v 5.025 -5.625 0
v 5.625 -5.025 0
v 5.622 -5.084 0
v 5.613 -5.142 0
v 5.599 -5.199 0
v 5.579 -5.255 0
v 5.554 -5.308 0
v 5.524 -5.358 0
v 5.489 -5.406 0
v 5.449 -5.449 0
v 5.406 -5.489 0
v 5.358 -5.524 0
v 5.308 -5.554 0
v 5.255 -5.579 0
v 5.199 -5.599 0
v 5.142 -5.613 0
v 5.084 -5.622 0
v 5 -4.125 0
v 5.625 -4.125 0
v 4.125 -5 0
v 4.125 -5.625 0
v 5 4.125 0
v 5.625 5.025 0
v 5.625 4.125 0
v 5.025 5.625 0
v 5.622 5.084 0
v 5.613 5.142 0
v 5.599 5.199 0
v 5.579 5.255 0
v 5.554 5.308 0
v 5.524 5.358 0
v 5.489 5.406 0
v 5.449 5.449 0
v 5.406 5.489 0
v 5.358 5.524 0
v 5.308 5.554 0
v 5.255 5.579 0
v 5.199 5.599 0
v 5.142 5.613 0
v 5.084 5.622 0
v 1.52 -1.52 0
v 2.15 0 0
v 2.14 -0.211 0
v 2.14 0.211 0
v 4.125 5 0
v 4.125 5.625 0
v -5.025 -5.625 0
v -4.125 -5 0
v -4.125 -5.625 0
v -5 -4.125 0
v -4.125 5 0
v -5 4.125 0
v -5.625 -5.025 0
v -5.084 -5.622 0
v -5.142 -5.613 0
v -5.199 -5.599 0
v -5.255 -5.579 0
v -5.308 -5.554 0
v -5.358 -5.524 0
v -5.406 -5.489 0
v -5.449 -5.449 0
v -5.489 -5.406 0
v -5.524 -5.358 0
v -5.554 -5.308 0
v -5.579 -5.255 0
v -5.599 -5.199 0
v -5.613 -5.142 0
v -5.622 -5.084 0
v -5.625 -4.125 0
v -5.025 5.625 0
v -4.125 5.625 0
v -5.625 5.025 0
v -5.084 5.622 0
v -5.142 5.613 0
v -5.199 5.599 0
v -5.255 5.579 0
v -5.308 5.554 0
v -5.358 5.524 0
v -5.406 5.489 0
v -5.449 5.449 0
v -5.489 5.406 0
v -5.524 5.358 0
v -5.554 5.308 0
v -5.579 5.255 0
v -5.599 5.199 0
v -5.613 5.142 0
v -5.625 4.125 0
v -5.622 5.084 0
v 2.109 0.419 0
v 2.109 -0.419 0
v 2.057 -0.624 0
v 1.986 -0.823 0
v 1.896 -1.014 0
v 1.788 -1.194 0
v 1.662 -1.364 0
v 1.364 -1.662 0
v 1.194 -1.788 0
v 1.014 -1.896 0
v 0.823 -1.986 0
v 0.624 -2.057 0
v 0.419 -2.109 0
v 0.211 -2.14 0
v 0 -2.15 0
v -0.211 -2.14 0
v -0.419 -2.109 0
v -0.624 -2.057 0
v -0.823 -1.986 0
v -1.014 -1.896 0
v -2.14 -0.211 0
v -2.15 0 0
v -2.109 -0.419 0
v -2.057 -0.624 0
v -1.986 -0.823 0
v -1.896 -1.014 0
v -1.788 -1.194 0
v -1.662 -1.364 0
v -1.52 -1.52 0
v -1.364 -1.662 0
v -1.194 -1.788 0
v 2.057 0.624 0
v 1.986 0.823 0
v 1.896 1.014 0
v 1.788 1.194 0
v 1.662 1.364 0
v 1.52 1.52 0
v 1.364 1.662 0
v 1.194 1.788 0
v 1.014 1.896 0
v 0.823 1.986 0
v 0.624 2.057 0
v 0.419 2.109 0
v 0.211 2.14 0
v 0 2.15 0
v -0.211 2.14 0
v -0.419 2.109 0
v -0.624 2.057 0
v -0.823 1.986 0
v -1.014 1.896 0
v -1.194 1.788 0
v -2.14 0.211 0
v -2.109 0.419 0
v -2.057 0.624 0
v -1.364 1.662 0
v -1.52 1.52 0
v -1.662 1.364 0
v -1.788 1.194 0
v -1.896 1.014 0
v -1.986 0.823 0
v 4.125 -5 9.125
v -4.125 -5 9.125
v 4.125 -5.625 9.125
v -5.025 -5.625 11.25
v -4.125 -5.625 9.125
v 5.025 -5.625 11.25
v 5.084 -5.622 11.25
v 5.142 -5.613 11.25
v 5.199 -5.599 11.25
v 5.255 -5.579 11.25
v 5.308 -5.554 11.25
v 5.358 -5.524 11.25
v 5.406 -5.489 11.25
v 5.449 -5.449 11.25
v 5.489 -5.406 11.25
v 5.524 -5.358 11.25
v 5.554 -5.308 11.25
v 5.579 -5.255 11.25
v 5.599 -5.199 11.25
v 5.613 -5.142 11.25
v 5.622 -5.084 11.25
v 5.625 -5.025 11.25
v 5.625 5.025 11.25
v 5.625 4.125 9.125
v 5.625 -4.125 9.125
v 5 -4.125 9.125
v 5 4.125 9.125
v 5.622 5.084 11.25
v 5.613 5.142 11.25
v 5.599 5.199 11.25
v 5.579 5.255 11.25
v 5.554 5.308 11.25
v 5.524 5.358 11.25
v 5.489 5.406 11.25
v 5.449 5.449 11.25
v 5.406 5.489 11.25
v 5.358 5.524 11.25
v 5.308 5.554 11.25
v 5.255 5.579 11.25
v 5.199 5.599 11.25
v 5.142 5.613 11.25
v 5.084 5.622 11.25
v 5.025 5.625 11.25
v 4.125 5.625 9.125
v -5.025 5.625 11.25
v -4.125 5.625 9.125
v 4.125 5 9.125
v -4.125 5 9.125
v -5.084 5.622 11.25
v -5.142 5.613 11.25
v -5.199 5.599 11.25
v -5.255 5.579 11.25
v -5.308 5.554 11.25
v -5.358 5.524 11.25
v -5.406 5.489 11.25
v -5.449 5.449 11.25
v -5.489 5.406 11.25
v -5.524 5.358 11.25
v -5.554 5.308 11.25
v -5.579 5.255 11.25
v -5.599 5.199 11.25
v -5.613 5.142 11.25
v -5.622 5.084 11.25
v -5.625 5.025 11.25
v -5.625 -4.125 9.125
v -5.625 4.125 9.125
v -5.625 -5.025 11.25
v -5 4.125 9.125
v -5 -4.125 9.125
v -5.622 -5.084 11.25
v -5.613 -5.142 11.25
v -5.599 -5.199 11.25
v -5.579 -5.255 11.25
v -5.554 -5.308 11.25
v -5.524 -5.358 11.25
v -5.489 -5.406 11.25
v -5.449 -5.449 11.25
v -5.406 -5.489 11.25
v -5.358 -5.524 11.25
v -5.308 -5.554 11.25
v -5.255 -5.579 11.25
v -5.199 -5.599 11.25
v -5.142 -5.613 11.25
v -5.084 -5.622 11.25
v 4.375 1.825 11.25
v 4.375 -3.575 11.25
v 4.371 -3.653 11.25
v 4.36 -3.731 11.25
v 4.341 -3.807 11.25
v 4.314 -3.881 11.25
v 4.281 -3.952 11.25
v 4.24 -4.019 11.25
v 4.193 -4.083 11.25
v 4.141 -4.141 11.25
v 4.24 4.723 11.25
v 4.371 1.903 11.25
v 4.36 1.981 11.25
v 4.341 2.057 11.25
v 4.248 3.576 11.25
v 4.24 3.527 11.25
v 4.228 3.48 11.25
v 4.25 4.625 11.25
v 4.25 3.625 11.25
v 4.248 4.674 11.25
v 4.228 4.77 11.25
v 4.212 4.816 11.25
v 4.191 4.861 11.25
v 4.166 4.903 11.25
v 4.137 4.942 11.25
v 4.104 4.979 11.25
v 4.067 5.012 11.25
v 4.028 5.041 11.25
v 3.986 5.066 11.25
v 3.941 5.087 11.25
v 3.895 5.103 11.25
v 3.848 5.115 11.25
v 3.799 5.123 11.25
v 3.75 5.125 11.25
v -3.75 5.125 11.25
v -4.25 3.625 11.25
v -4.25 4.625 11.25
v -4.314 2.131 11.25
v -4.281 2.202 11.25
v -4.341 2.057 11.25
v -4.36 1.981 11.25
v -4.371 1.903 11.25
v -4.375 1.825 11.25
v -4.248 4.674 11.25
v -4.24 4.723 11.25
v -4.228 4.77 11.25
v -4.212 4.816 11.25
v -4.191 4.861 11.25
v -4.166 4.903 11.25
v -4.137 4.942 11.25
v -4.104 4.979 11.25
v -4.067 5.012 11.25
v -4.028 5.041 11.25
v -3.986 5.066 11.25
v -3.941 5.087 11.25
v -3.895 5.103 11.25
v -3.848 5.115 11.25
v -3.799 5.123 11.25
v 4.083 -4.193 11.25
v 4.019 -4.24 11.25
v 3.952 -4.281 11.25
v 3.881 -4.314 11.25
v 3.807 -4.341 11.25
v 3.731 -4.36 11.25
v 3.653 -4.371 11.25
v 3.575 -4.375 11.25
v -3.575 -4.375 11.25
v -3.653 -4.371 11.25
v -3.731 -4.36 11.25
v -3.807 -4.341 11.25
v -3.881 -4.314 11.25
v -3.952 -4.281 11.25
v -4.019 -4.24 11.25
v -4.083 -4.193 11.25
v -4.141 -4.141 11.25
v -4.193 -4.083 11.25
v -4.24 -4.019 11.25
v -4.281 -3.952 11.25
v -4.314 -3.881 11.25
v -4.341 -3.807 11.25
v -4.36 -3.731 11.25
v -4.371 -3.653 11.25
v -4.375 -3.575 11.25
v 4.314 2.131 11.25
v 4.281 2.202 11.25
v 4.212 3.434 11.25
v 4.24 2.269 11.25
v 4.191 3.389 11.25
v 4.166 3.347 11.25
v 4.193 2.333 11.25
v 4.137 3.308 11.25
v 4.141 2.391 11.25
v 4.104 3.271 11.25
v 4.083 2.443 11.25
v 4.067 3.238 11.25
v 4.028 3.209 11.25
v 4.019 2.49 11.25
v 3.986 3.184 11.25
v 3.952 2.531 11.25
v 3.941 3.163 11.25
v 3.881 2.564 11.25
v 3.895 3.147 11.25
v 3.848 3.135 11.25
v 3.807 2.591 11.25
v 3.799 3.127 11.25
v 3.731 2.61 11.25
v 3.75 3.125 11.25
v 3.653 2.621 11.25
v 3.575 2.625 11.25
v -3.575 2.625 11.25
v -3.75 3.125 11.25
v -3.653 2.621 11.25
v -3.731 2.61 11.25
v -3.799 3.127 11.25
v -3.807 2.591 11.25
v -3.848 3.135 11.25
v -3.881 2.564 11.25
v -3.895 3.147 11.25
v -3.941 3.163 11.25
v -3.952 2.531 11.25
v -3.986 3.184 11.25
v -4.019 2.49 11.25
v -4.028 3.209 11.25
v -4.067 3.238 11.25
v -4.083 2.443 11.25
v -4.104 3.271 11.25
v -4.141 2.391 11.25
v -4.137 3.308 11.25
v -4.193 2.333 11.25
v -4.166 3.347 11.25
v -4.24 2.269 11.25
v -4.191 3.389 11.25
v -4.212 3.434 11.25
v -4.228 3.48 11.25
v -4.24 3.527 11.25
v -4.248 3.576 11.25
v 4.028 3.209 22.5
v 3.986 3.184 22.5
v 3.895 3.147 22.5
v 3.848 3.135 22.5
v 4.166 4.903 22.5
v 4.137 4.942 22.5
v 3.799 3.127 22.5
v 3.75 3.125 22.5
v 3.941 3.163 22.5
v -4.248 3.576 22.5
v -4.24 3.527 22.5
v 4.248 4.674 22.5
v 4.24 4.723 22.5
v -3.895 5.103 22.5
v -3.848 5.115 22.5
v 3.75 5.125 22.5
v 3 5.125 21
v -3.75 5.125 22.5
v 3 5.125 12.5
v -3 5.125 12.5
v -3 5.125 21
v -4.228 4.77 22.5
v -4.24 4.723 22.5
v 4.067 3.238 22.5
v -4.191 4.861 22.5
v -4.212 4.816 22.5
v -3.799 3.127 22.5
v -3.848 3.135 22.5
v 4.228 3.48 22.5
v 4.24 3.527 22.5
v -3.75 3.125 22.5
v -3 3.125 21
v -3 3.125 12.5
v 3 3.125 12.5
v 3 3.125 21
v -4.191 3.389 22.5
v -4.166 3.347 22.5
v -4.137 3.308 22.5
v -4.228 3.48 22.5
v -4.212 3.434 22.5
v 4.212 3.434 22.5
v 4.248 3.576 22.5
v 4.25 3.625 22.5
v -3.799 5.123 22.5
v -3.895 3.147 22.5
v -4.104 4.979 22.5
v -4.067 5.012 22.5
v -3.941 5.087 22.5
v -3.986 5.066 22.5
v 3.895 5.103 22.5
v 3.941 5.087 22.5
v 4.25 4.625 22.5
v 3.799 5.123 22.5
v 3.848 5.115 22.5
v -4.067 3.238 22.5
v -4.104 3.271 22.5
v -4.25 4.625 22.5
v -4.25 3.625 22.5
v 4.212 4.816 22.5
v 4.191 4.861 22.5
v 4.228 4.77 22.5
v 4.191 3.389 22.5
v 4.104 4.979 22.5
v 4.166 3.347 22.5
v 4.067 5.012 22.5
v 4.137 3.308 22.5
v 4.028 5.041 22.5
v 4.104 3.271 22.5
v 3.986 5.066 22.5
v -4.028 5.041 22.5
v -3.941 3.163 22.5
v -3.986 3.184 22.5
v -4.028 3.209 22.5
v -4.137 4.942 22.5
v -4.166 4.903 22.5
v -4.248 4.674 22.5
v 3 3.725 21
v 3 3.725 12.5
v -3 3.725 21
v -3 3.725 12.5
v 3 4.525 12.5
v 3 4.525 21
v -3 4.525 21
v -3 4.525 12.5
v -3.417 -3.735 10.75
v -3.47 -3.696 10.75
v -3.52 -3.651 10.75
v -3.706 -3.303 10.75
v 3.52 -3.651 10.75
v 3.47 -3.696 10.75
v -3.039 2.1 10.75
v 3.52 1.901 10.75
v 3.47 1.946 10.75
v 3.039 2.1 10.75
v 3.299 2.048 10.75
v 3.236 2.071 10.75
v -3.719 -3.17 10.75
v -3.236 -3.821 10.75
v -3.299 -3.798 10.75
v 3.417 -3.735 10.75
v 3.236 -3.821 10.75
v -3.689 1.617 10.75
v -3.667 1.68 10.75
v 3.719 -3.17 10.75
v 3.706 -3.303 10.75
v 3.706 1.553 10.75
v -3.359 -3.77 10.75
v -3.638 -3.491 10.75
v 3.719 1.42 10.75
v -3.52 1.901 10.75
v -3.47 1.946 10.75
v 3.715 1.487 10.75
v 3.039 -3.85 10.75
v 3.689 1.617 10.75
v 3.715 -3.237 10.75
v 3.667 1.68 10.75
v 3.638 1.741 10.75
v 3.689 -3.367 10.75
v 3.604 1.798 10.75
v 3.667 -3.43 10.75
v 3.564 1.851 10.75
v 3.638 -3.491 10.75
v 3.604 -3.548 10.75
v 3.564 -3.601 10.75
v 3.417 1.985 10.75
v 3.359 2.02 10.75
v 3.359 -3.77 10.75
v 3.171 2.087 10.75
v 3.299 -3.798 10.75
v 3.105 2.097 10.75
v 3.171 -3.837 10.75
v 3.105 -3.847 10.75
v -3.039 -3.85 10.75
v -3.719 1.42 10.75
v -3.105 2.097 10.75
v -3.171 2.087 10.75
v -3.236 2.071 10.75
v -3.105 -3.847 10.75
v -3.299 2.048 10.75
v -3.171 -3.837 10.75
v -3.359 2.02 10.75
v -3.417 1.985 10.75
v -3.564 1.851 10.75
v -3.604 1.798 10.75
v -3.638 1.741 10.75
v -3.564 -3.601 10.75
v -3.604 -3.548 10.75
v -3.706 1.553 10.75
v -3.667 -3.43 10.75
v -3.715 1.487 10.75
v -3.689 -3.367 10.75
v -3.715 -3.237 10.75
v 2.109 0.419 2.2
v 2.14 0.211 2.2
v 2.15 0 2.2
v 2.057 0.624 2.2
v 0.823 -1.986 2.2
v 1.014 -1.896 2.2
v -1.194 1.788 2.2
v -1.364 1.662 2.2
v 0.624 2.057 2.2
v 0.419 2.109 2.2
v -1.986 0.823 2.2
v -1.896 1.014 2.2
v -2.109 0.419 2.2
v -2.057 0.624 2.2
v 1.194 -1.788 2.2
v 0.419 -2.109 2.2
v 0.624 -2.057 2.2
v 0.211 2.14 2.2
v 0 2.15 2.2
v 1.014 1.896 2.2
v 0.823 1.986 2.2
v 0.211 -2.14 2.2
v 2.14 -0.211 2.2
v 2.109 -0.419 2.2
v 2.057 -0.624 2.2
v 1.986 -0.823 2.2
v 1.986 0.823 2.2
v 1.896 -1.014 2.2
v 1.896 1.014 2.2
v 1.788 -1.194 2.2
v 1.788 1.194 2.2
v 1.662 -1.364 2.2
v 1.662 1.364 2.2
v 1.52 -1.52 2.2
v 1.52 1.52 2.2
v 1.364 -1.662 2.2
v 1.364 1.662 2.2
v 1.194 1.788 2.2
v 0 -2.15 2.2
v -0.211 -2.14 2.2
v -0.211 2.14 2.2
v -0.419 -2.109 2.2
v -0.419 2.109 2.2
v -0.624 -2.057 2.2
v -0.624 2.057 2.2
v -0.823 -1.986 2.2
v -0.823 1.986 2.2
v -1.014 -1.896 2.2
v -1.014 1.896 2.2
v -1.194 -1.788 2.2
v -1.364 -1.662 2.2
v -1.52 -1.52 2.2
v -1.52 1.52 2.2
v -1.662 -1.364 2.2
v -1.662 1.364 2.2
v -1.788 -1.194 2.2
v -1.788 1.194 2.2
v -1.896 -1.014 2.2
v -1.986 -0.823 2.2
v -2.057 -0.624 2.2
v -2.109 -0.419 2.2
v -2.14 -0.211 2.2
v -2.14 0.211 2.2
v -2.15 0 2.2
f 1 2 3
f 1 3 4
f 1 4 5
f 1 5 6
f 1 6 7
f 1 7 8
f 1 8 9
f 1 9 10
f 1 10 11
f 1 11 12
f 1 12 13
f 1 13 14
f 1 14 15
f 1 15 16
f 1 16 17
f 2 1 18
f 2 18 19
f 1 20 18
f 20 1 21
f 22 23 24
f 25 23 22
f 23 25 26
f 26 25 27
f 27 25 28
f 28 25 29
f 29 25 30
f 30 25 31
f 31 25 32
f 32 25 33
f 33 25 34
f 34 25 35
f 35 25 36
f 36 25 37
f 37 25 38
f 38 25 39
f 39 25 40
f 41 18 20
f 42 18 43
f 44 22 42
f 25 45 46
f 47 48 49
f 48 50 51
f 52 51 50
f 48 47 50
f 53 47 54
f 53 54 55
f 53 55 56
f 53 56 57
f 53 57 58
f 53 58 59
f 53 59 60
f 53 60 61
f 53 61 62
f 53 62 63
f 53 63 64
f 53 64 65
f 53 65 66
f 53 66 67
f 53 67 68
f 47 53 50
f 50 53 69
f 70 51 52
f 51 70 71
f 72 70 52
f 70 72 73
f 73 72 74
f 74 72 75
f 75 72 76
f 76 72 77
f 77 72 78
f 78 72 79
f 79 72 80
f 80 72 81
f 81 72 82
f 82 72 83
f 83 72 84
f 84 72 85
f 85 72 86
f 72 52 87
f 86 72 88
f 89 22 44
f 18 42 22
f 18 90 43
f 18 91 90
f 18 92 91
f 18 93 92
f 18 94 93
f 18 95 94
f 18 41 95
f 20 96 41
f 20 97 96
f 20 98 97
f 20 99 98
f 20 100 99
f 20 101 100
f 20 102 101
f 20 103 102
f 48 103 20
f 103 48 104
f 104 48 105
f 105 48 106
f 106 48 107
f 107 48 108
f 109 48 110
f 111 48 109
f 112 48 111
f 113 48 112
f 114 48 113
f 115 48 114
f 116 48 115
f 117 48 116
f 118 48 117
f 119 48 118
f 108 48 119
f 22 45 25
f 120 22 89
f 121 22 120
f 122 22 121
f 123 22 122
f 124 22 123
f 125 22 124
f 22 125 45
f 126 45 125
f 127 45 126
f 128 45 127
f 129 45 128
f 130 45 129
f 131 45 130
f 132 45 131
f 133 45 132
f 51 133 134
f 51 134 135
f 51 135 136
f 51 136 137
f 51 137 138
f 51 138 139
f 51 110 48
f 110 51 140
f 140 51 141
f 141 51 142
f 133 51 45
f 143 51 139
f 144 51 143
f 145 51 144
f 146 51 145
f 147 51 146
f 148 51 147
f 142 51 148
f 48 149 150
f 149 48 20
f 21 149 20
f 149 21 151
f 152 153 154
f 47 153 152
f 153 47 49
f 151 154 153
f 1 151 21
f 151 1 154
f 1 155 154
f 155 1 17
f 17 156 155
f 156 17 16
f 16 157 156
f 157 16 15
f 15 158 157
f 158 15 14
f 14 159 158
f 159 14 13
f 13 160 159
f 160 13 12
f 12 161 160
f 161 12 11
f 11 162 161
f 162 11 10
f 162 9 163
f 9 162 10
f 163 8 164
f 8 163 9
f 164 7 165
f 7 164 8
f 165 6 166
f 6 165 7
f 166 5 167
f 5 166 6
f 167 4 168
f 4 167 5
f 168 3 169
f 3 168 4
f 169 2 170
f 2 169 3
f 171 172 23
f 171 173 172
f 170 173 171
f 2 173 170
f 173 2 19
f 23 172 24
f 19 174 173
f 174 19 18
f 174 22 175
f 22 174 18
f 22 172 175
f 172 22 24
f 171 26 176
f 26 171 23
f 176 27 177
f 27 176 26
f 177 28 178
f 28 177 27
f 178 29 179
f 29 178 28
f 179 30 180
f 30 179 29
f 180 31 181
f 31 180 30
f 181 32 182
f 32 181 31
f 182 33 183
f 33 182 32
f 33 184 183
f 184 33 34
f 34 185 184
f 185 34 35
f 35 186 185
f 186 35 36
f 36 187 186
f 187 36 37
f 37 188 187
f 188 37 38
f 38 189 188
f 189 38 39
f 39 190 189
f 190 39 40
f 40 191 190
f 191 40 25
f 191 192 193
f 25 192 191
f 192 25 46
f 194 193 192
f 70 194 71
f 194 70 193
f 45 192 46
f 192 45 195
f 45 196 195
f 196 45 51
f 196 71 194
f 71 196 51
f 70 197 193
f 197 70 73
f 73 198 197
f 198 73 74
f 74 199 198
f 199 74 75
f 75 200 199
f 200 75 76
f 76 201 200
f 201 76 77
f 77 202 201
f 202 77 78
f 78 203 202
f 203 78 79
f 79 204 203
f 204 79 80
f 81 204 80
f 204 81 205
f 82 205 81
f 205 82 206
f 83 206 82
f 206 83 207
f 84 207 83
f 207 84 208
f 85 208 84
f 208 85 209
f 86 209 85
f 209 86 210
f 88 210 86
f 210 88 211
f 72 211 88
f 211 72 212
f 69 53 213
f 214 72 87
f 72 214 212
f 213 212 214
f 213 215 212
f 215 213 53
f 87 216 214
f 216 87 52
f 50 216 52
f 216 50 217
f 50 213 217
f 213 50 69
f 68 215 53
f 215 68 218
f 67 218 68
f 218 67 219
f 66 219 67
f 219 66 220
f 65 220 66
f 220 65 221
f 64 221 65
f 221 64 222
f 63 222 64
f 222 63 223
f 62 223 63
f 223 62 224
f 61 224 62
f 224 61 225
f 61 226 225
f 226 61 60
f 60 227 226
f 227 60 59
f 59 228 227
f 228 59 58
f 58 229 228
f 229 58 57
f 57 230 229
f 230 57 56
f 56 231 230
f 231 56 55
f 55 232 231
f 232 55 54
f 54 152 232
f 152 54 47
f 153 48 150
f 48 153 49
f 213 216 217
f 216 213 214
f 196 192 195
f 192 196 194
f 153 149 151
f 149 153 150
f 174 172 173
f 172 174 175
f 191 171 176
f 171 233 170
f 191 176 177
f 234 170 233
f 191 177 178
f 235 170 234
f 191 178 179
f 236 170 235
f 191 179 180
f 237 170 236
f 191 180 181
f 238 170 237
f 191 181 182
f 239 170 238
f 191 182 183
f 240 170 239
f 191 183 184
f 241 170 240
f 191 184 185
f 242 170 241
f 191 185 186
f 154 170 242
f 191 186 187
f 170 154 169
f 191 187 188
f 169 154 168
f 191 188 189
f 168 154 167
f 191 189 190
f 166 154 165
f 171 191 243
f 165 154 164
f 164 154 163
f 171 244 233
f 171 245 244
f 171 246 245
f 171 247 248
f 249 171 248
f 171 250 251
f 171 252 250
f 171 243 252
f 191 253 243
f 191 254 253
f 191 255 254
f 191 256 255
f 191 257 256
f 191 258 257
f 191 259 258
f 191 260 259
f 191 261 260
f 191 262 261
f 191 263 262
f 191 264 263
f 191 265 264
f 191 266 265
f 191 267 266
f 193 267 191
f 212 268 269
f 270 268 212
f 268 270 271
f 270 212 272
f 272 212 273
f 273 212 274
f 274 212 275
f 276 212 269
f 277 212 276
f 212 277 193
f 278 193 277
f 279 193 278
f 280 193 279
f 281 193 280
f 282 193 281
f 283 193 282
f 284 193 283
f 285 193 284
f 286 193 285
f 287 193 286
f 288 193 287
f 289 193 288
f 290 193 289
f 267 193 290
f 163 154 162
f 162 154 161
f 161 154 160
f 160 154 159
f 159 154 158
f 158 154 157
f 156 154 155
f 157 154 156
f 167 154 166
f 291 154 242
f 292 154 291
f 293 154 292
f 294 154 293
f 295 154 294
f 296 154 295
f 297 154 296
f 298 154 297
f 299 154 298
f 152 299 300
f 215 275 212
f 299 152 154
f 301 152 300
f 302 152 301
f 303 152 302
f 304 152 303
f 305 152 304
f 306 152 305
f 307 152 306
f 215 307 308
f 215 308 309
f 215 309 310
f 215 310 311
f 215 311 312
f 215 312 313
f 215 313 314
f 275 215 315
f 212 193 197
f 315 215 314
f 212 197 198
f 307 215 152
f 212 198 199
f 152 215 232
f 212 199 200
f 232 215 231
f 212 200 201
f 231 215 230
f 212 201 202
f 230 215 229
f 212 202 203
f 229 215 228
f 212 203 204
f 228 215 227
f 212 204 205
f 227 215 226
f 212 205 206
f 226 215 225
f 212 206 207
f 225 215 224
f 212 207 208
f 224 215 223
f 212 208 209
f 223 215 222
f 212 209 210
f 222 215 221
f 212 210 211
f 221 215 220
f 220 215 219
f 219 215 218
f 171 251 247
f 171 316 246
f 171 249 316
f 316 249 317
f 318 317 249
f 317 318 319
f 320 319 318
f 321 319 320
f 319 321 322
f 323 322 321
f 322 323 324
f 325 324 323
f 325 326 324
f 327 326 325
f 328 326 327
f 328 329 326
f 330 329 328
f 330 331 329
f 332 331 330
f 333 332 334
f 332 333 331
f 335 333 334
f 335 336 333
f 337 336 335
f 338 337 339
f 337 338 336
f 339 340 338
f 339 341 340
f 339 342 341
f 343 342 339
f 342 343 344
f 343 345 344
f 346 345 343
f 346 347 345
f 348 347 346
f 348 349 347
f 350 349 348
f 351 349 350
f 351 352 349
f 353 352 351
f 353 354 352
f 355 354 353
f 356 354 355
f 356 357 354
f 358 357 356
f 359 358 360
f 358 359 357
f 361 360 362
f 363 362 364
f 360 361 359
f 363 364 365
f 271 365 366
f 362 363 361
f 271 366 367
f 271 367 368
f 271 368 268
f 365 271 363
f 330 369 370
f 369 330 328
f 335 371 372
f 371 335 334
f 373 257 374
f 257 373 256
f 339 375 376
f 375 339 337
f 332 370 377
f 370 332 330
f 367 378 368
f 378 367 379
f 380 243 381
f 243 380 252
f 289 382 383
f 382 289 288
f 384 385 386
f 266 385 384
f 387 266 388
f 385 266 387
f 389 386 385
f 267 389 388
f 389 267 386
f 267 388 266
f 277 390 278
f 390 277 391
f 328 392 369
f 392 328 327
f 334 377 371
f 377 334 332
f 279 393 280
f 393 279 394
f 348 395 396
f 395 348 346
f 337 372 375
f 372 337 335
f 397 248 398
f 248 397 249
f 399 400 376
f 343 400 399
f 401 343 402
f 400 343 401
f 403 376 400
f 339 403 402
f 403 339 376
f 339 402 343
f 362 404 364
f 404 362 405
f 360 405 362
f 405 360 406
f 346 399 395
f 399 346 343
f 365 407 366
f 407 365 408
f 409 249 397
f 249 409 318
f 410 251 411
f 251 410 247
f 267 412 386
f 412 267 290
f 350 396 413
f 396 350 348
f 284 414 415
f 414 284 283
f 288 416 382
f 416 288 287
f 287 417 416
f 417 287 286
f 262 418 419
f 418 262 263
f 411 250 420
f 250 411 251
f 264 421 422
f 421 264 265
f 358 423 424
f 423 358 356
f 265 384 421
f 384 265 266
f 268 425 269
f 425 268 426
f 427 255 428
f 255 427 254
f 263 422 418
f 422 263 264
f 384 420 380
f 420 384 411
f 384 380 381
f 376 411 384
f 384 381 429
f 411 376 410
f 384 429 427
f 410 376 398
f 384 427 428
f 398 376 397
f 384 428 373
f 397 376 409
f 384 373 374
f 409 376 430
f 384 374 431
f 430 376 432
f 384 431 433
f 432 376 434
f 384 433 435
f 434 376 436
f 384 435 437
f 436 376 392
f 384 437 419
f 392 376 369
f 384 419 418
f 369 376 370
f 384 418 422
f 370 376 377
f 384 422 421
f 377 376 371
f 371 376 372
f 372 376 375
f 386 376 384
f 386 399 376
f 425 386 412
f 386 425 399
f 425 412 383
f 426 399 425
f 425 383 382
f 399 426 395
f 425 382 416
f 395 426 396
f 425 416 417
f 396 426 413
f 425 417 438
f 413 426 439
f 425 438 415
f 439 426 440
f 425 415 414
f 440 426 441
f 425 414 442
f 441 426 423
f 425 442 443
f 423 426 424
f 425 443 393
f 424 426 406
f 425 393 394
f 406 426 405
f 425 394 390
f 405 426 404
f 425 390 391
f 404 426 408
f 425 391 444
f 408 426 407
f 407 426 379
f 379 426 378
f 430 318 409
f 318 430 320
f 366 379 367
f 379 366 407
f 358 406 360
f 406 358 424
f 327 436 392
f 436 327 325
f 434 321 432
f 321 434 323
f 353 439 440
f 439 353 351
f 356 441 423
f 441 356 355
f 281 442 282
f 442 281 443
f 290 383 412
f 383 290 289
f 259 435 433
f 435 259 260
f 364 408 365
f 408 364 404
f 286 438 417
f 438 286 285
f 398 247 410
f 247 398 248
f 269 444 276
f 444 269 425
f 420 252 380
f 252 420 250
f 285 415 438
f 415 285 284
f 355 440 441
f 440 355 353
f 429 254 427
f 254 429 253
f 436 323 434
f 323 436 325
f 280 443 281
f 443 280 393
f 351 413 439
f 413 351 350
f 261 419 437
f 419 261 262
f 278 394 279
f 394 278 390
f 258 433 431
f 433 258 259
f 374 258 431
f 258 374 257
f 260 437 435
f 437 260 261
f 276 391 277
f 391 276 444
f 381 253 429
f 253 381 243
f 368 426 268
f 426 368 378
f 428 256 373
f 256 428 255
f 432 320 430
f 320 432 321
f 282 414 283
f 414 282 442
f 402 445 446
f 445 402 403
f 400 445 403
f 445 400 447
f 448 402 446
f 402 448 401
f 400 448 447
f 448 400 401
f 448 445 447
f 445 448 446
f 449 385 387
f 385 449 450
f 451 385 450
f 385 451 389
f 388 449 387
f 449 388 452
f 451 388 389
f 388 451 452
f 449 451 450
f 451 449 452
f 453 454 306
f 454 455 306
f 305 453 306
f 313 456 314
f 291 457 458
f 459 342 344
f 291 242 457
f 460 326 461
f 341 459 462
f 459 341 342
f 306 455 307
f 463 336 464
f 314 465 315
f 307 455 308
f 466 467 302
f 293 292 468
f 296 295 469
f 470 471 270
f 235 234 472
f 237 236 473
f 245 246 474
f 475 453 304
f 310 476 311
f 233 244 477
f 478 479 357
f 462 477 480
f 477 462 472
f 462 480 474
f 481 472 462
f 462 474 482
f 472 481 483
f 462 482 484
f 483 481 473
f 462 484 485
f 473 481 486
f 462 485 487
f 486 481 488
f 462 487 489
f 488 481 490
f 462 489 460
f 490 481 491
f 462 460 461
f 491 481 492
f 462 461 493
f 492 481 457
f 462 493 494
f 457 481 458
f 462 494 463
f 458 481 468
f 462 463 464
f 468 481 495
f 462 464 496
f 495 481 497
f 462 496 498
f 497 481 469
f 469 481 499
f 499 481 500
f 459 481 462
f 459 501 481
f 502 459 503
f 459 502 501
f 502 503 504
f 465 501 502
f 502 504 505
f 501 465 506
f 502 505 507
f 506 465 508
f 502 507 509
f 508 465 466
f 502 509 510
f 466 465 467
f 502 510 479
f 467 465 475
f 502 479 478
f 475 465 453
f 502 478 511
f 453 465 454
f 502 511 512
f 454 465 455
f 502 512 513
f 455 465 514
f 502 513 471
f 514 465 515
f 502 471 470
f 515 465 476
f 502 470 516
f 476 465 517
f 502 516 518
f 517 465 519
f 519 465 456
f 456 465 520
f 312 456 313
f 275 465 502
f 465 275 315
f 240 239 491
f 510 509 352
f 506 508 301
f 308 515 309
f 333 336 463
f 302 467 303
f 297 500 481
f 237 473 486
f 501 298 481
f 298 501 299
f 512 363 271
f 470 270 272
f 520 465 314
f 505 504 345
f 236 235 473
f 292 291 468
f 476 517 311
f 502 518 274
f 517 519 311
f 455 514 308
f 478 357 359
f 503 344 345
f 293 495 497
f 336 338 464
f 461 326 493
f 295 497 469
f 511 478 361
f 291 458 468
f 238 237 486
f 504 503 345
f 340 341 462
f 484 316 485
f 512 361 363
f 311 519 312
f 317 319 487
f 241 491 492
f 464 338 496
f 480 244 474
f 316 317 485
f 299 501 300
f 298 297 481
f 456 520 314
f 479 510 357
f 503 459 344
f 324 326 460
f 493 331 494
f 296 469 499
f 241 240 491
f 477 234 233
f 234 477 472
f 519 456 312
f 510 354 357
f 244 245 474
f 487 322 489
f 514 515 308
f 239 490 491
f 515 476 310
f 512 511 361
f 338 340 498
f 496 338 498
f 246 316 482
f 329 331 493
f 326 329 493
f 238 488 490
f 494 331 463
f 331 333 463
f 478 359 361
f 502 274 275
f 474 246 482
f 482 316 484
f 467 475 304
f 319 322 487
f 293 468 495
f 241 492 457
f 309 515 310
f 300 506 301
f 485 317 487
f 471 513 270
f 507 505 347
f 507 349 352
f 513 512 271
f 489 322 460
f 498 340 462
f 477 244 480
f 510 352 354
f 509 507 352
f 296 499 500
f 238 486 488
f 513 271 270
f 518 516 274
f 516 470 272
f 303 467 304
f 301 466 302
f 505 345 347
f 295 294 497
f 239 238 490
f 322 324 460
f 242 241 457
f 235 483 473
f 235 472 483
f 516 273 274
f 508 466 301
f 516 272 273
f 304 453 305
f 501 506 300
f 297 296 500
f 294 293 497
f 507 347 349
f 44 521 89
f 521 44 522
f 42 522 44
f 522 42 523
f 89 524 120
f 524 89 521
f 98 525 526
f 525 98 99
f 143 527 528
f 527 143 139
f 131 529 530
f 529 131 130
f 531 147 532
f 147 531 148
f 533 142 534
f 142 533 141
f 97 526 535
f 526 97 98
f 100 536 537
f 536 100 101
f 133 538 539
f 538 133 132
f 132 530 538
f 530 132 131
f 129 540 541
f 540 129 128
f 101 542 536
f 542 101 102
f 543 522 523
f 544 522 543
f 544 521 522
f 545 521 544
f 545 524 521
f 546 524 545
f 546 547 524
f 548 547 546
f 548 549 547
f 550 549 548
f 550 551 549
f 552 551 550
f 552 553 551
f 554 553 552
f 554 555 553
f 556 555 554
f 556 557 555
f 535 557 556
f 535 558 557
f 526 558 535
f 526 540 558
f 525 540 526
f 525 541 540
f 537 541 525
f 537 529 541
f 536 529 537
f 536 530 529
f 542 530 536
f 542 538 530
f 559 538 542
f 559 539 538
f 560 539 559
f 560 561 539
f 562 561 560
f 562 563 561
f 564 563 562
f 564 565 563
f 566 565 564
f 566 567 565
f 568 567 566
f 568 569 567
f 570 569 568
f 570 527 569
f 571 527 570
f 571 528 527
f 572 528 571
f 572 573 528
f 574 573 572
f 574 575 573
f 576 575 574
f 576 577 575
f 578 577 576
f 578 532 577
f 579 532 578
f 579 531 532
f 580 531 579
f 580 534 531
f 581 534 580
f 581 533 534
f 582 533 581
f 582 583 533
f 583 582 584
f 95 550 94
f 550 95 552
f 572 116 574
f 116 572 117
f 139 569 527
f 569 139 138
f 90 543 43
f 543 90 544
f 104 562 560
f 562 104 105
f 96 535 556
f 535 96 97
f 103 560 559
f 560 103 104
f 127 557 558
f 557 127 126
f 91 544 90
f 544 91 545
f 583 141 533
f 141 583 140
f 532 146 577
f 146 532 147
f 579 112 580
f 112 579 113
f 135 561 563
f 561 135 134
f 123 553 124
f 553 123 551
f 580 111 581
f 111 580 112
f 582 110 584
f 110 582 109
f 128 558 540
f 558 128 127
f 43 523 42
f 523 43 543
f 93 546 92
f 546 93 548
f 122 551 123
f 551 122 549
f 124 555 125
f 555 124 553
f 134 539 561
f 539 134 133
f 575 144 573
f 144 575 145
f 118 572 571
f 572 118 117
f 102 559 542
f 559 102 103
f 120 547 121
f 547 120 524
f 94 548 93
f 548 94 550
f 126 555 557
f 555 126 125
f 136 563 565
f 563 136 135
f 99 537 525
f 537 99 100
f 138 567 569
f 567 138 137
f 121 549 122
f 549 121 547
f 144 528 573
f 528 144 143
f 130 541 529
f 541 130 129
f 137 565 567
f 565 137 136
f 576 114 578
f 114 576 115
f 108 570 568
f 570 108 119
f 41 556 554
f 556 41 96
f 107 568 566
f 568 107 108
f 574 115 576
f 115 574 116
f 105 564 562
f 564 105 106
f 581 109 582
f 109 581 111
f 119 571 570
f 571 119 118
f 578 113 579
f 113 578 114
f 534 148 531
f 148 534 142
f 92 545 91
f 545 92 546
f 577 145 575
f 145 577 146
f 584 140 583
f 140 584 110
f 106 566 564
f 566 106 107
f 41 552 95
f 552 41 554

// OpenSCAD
// diningroom / chair — a dining chair: a dished seat on four corner legs, with a
// framed back panel rising off the back of it. Nothing about it is the task chair
// (office/chair.scad — a five-star base, a column and a wrap-around back): this one is
// a frame, and that is exactly how the two are told apart on the plan.
//
// In section, across the chair:
//
//        |‾‾|          the back panel, its field sunk on BOTH faces so it reads as a
//        |  |          frame round a splat from either side ...
//     ___|__|___       ... the seat slab, dished for real, standing proud all round ...
//    |  |      |  |    ... on the rail, set back behind ...
//    |__|      |__|    ... the four corner legs
//
// It used to be a plain block with a flat pad in front of a raised one — two cushions on
// a brick, and at 11 mm tall the block was most of what you saw. The three things a
// chair is read by are now real: legs at the corners (legged_block() in lib/common.scad),
// a seat you can put a fingertip into, and a back with a frame round it. It still prints
// the right way up with nothing to support: the legs and the back rise straight, the
// flare under the slab is 45 deg, and the dish and the two field recesses are cuts.
//
// No raised seat cushion: a dish and a cushion are two answers to the same question, and
// the dish is the one that reads from directly above, which is how a plan is read. Turn
// Show_dish off and Show_cushion on for an upholstered chair.
//
// Width/Depth are the real-world seat footprint in cm. The heights are real cm too:
// Height is the top of the back — how tall the chair is — and Seat the seat it rises
// from (see printed_h() / rise() in lib/common.scad).

include <../lib/common.scad>

Width  = 45;  // cm
Depth  = 45;  // cm
Height = 90;  // cm — top of the back
Seat   = 45;  // cm — seat height

// the printed height of the seat, mm — the back stands the rest on it
Seat_z = printed_h(Seat);

// The frame, in real cm: a chair's legs are slimmer than a cabinet's posts and its seat
// slab thicker, so it does not take the library's defaults (Leg_* in lib/common.scad).
Leg      = 6;    // cm — a corner leg, seen on both faces it turns
Leg_rail = 2.5;  // cm the rail between two legs is set back behind them
Slab     = 6;    // cm of the height the seat slab takes

Show_dish = true;
// The dish, in real cm — a moulded seat, hollowed for real (see hollow()). It keeps a
// rim all round and stops short of the back panel, so the seat reads as a seat and not
// as a tray. Shallow, and nearly all of it flat floor (Dish_floor, against the library's
// deeper default): a seat you sit on is not a bowl, and a 2 cm dish is already 0.5 mm of
// shadow at 1:40.
Dish_depth = 2;
Dish_floor = 0.85;
Dish_rim   = 5;
Dish_gap   = 2;   // cm left between the dish and the front of the back panel
Dish_r     = 0.8; // printed mm, corner rounding of the dish — softer than the frame

Show_cushion  = false;  // an upholstered seat instead of a dished one
Cushion_rim   = 5;      // cm of seat left showing round it
Cushion_h     = 4;      // cm it stands proud

Show_back = true;
// The back panel, in real cm: narrower than the seat and set in from the rear edge, the
// way a chair's back sits inside its footprint. It rises straight — a vertical wall is
// nothing for the printer, and a taper would eat the thickness the two field recesses
// need — with the field sunk from the front AND the back, leaving a web between them.
Back_w      = 34;
Back_d      = 8;
Back_gap    = 2;
Back_r      = 0.5;  // printed mm — a panel this thin would collapse under Corner_radius
Back_stile  = 5;    // cm of frame left at each side of the sunken field ...
Back_rail_b = 5;    // ... under it, above the seat ...
Back_rail_t = 6;    // ... and over it, at the top of the back
Back_cut    = 0.6;  // mm the field is sunk into each face of the panel

// Magnet pockets in the bottom face (0 = none). One central pocket: the piece is small
// enough that it cannot pivot far. The pocket goes in the rail, which is the broad part
// of the bottom face — 40 cm of it is 10 mm at 1:40, comfortably wide enough for a 4 mm
// disc (see legged_floor_w() and Magnet_* in lib/common.scad).
Magnets = 1;

// ---- what fits where --------------------------------------------------------
// The back panel's front face and its centre, real cm from the middle of the seat.
function back_front() = Depth / 2 - Back_gap - Back_d;
function back_cy()    = back_front() + Back_d / 2;
// The dish: the seat less its rim, and less what the back panel and its clearance take
// at the rear — so it is pushed forward, as the part of the seat you actually sit on.
function dish_d()  = max(0, (back_front() - Dish_gap) - (-Depth / 2 + Dish_rim));
function dish_cy() = ((back_front() - Dish_gap) + (-Depth / 2 + Dish_rim)) / 2;
function dish_w()  = max(0, Width - 2 * Dish_rim);
// Corner rounding of the dish, clamped so a small one cannot be rounded away to nothing
// — footprint_2d() erodes by r before it grows back.
function dish_r() = max(0, min(Dish_r, min(cm(dish_w()), cm(dish_d())) / 2 - 0.05));

chair();

module chair() {
    difference() {
        union() {
            legged_block(Width, Depth, Seat_z, Leg, Leg_rail, Slab);
            if (Show_back) back();
            if (Show_cushion)
                translate([0, cm(dish_cy()), 0])
                    cushion(Width - 2 * Cushion_rim, dish_d(), Seat_z, Cushion_h);
        }
        // the dish, sunk into the seat slab
        if (Show_dish && !Show_cushion && dish_w() > 0 && dish_d() > 0)
            translate([0, cm(dish_cy()), 0])
                hollow(Seat_z, rise(Dish_depth), Dish_floor)
                    footprint_2d(dish_w(), dish_d(), dish_r());
        // the field of the back panel, sunk from both faces
        if (Show_back) field();
        if (Magnets > 0)
            magnets(legged_floor_w(Width, Depth, Leg_rail),
                    legged_floor_d(Width, Depth, Leg_rail), Magnets);
    }
}

// The back panel: a straight upright standing on the rear of the seat, from the seat up
// to Height.
module back() {
    translate([0, cm(back_cy()), Seat_z - 0.01])
        linear_extrude(height = rise(Height - Seat) + 0.01)
            footprint_2d(Back_w, Back_d, Back_r);
}

// Its sunken field, cut into both faces of the panel: what is left standing is a stile
// each side, a rail under it and a deeper rail over it — a chair back, from the front and
// from behind. The web between the two cuts is what carries it, so the cuts are kept to
// Back_cut and the panel is never tapered.
module field() {
    fw = cm(Back_w - 2 * Back_stile);
    fh = rise(Height - Seat - Back_rail_b - Back_rail_t);
    cz = Seat_z + rise(Back_rail_b) + fh / 2;
    web = cm(Back_d) - 2 * Back_cut;
    if (fw < Symbol_stroke || fh < Symbol_stroke || web < Symbol_stroke)
        echo(str("WARNING: a ", Back_w, "x", Back_d, " cm back at 1:", Scale,
                 " has no room for a field — left solid"));
    else
        translate([0, cm(back_cy()), 0]) {
            front_recess(0, cz, fw, fh, Back_d, Back_cut);
            back_recess(0, cz, fw, fh, Back_d, Back_cut);
        }
}
